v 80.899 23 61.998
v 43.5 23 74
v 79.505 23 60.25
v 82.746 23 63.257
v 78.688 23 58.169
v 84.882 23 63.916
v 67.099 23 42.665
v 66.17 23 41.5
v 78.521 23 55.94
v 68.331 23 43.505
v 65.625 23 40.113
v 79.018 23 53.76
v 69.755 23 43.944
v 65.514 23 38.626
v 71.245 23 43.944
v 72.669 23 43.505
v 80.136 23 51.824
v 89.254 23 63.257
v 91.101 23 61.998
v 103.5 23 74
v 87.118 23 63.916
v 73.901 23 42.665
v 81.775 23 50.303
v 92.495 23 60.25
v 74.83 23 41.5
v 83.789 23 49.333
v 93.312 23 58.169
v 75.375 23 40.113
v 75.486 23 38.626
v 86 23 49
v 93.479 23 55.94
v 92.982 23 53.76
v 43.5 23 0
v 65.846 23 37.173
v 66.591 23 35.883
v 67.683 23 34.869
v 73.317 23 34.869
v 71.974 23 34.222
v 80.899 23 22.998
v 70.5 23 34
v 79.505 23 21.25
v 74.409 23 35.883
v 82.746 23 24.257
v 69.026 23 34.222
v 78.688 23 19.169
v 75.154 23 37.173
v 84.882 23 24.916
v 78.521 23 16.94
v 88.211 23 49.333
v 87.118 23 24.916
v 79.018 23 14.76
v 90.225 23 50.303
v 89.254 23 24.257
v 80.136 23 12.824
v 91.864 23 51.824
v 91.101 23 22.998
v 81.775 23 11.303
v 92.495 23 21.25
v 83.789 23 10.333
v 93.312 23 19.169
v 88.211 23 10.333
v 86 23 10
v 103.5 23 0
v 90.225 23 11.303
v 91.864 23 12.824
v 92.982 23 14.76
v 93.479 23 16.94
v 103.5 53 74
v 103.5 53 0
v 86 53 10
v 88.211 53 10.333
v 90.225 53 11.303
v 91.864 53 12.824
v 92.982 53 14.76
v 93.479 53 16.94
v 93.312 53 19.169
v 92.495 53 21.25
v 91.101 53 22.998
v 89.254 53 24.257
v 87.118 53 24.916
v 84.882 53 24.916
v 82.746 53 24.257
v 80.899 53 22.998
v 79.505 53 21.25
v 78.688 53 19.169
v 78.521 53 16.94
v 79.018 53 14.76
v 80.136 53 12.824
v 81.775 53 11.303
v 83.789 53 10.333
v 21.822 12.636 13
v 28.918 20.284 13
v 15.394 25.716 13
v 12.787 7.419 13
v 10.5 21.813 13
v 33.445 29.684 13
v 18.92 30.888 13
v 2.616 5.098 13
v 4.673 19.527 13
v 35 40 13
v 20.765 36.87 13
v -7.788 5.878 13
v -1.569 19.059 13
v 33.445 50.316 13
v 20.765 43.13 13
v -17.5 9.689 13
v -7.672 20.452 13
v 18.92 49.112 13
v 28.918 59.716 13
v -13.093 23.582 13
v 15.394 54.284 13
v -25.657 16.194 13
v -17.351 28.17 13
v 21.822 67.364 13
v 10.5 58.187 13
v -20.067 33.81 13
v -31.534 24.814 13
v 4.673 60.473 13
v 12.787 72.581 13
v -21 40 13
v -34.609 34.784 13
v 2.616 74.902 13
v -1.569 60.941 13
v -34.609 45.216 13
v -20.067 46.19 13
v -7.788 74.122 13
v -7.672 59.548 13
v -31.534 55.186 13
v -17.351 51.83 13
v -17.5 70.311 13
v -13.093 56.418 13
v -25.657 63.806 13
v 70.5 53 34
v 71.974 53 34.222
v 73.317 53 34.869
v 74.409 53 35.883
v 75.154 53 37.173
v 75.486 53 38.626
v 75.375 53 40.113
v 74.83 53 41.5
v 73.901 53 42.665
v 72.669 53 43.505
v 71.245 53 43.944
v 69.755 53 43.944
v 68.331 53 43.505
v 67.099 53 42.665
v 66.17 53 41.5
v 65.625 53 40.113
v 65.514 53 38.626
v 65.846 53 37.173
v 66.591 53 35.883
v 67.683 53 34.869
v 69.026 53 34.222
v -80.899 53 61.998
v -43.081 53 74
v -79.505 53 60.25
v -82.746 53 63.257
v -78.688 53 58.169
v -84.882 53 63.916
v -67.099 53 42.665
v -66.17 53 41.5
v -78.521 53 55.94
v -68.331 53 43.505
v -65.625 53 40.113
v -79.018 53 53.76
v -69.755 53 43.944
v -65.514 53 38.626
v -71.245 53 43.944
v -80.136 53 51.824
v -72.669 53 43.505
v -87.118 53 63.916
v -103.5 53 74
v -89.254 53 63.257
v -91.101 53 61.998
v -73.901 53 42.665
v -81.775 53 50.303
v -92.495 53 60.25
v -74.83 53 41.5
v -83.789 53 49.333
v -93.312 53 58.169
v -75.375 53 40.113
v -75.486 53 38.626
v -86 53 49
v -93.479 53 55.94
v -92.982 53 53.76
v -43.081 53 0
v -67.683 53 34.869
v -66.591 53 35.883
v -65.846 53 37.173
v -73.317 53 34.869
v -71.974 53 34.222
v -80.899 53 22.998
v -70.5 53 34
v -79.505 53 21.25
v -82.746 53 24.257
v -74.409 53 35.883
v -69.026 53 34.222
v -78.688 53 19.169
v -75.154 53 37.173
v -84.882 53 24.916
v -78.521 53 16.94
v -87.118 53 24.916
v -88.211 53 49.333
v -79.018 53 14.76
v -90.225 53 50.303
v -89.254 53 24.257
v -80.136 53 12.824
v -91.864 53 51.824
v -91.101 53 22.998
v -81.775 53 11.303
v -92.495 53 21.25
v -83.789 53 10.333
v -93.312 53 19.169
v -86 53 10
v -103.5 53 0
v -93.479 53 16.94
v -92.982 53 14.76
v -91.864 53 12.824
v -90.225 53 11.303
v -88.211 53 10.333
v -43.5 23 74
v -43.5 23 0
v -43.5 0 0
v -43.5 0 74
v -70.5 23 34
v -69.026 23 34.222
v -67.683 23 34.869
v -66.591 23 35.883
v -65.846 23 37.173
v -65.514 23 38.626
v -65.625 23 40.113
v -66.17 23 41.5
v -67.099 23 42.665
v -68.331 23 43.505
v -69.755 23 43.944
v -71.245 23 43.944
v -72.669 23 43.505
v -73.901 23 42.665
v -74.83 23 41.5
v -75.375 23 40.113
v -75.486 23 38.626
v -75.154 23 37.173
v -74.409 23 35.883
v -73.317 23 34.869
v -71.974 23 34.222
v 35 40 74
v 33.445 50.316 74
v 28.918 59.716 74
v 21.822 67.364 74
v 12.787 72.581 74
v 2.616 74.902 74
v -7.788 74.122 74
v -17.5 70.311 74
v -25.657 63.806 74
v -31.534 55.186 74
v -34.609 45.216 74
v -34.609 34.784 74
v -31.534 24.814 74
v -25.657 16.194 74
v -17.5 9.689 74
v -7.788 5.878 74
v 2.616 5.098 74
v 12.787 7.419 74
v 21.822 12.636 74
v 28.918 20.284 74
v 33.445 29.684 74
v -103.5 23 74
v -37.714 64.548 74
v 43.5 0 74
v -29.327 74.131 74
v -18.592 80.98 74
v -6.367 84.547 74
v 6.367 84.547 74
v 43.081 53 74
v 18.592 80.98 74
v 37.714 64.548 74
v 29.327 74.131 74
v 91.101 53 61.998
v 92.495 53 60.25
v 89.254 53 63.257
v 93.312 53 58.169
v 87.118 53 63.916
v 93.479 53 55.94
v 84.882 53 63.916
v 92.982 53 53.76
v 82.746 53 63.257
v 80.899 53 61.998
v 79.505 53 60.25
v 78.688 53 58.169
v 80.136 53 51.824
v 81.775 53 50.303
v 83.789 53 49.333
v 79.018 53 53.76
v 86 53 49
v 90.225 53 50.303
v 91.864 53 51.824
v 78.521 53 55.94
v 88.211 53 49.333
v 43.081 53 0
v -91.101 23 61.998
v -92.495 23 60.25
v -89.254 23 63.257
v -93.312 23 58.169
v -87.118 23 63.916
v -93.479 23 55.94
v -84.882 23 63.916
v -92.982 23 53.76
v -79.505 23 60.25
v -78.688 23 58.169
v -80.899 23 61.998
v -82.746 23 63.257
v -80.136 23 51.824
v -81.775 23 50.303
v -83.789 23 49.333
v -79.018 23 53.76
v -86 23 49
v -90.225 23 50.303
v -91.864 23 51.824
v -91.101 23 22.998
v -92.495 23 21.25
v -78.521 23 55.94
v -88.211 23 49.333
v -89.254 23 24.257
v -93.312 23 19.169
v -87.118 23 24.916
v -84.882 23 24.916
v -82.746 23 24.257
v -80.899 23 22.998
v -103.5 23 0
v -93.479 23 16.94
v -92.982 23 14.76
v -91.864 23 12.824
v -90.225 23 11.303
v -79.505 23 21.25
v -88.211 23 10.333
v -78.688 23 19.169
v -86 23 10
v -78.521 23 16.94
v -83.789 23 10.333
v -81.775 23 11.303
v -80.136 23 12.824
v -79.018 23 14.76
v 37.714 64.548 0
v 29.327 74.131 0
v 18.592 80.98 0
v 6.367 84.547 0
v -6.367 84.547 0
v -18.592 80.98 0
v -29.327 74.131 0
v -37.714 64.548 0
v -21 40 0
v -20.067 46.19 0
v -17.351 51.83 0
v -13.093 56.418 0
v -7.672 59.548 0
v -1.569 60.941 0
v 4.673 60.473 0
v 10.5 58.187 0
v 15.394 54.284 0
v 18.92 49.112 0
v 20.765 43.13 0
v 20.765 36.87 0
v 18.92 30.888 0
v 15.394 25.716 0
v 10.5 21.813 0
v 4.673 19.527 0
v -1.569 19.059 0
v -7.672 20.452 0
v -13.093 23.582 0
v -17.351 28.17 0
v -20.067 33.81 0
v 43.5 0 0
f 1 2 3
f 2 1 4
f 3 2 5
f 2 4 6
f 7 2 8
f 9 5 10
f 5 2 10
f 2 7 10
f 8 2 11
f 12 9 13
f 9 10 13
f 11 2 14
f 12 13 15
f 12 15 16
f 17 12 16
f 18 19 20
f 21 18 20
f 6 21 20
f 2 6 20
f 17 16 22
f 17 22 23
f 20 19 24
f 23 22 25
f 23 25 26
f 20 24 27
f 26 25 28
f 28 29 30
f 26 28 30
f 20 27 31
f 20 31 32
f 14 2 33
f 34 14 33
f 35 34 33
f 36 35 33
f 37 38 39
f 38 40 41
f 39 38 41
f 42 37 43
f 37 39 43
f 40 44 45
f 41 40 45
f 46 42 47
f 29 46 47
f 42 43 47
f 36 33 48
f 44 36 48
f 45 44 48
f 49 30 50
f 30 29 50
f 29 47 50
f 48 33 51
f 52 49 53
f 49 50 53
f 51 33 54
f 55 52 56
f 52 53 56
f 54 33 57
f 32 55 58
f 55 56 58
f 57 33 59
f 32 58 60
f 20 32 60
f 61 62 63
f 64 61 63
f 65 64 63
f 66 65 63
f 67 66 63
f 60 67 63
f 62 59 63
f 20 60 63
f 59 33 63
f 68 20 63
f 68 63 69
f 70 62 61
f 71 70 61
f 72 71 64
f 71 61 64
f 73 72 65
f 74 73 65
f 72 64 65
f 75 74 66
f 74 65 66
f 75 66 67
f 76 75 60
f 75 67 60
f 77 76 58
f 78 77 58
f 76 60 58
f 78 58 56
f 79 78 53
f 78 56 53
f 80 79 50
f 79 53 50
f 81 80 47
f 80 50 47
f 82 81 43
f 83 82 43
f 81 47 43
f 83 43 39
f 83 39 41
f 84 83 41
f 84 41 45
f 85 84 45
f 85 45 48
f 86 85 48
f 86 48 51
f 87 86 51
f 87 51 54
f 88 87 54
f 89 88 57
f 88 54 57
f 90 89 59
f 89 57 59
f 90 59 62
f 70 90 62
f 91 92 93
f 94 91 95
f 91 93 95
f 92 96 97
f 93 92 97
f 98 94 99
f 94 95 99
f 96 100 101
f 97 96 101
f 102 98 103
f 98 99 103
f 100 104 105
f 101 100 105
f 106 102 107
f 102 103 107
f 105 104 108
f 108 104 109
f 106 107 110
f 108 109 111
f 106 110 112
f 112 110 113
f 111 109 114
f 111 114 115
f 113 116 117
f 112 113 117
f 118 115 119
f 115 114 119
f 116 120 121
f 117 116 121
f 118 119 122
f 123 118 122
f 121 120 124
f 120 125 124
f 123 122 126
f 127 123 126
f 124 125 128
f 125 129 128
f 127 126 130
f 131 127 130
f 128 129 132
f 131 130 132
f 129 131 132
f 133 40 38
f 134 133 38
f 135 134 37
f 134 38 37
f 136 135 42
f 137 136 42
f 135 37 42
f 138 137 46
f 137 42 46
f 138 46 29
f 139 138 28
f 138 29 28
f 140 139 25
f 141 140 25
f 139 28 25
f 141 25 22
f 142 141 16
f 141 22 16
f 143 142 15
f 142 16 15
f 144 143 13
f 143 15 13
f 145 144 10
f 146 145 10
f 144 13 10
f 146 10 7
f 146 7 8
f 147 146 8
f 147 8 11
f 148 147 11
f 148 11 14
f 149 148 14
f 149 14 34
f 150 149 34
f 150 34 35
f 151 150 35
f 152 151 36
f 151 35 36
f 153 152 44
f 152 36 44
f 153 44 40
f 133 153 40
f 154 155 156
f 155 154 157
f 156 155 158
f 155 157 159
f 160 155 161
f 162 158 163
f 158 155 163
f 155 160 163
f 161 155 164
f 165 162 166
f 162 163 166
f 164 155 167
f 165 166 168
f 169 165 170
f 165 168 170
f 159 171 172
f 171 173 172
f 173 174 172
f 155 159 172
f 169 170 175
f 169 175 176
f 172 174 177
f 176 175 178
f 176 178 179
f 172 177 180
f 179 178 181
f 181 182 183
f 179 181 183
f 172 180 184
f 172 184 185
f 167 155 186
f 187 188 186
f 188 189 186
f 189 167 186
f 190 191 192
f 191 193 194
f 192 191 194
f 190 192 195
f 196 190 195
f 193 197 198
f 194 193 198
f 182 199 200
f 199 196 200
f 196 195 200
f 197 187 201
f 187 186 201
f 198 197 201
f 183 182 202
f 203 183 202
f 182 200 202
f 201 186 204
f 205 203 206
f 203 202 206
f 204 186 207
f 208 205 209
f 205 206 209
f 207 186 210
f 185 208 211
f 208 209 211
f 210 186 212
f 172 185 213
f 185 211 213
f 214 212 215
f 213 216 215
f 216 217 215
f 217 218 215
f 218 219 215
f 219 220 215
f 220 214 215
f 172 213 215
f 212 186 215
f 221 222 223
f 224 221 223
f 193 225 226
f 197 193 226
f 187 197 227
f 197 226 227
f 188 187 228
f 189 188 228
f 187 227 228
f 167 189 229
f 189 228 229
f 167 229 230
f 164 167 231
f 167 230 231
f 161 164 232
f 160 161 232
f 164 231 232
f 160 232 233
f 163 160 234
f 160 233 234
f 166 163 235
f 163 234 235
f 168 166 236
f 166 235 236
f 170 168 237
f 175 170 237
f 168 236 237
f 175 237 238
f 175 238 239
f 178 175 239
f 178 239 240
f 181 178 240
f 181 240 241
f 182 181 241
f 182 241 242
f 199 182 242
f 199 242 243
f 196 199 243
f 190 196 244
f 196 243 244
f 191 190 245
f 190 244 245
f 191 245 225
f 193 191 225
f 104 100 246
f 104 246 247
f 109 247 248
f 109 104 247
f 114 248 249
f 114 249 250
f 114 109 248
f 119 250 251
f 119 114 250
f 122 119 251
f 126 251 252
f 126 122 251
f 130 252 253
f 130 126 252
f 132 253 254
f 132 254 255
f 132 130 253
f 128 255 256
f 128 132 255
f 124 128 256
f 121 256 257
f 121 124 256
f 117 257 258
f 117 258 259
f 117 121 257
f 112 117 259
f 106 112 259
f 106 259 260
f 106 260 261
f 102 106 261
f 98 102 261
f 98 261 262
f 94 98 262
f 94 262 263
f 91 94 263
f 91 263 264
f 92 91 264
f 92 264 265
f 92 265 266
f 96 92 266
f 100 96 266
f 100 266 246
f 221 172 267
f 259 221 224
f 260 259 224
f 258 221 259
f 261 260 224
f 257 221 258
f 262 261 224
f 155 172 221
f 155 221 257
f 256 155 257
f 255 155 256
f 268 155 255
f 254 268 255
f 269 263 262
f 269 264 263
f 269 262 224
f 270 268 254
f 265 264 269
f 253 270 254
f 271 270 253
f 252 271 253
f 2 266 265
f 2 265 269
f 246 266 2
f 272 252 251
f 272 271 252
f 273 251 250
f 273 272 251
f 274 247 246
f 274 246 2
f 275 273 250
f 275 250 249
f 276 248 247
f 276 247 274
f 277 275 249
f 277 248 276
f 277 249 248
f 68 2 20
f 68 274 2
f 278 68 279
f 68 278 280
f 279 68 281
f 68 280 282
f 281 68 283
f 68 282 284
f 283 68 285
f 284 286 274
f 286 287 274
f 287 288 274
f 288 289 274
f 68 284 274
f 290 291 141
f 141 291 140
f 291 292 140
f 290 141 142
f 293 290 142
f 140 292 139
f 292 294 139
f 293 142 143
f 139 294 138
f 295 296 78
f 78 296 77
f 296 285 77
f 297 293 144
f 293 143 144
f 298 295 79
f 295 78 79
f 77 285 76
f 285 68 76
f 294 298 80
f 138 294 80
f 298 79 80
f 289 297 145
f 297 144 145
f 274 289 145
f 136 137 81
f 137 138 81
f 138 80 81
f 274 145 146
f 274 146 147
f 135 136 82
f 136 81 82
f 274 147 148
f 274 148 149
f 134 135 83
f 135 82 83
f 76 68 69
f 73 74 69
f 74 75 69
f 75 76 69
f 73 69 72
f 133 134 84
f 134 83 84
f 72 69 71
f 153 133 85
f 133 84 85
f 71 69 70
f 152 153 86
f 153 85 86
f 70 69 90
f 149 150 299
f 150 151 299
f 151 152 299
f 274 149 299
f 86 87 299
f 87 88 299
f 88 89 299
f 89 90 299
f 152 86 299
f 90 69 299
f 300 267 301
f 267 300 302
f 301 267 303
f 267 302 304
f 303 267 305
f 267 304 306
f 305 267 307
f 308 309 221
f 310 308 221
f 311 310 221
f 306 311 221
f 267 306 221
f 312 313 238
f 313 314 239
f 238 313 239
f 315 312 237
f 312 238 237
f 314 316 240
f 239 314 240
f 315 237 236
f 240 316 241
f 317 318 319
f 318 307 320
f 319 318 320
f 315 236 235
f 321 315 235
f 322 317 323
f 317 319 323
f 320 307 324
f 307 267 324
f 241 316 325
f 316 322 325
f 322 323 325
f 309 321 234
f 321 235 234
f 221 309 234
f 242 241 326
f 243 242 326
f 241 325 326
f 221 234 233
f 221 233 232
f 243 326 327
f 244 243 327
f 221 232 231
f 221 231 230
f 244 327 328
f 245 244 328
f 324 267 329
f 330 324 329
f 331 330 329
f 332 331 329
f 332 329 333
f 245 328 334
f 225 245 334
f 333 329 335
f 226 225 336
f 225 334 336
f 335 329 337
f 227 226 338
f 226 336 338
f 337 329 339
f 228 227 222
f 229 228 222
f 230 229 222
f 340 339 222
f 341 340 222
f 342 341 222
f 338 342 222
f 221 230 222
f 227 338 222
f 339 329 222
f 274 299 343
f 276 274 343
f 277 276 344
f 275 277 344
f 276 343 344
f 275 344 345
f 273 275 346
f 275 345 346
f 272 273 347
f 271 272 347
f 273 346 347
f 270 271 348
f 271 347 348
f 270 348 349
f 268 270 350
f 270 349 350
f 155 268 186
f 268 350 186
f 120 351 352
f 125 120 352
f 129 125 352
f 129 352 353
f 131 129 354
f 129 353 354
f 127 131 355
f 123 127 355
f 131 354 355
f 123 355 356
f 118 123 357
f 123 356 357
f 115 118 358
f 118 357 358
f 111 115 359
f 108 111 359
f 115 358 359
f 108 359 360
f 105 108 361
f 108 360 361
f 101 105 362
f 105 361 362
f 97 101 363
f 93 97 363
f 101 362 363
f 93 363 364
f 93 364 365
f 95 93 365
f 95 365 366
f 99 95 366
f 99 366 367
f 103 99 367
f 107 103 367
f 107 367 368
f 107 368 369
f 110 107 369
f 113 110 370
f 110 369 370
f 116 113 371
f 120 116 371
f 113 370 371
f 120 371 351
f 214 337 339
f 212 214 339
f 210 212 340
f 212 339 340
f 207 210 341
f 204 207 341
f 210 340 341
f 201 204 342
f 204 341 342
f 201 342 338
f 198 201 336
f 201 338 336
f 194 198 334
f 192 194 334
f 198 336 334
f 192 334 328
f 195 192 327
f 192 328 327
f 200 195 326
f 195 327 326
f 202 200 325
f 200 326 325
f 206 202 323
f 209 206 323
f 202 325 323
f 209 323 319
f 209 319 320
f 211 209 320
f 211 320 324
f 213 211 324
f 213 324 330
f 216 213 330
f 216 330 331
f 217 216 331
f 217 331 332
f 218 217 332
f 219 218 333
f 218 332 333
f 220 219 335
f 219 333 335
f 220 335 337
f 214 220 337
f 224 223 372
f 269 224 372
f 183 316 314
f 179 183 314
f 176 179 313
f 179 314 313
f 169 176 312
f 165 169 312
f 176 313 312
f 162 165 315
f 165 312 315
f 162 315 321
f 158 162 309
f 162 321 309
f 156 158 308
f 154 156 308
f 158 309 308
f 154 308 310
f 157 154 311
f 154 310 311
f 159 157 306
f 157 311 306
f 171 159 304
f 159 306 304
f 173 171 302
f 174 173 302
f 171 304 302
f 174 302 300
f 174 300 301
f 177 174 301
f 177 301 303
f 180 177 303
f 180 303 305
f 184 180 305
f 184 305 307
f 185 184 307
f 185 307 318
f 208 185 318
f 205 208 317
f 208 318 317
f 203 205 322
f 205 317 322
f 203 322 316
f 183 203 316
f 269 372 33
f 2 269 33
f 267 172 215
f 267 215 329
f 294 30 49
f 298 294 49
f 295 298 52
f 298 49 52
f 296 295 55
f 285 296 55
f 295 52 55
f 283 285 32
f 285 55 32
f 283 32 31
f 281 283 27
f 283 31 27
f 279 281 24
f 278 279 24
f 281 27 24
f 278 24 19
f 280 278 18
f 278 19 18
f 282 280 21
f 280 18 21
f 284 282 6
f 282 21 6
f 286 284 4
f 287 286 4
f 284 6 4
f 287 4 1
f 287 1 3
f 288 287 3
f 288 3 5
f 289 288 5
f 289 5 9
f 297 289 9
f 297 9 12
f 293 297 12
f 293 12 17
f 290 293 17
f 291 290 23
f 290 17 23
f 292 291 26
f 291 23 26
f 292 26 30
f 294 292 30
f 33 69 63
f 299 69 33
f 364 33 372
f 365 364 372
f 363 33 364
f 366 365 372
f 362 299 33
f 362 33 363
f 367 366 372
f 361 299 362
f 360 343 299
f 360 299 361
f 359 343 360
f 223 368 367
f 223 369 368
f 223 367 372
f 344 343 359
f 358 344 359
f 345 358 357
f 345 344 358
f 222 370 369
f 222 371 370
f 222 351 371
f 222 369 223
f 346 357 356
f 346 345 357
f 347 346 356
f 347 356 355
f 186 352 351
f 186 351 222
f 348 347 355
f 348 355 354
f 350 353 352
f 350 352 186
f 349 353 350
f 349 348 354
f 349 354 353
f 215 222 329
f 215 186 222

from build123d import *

# Parameters (mm, degrees)
SKETCH_1_R          = 35
EXTRUDE_1_DEPTH     = 74
SKETCH_2_R          = 35
SKETCH_2_R_2        = 21
EXTRUDE_2_DEPTH     = 13
SKETCH_3_R          = 7.5
SKETCH_3_R_2        = 5
CUT_EXTRUDE_1_DEPTH = 30


with BuildPart() as part:
    # 草图1 → 凸台-拉伸1 (new body)
    with BuildSketch(Plane.XY):
        with BuildLine():
            Line((-43.5, 0), (43.5, 0))
            Line((43.5, 0), (43.5, 23))
            Line((43.5, 23), (103.5, 23))
            Line((103.5, 23), (103.5, 53))
            Line((103.5, 53), (43.081318457, 53))
            ThreePointArc((43.081318457, 53), (0, 85), (-43.081318457, 53))
            Line((-43.081318457, 53), (-103.5, 53))
            Line((-103.5, 53), (-103.5, 23))
            Line((-103.5, 23), (-43.5, 23))
            Line((-43.5, 23), (-43.5, 0))
        make_face()
        with Locations((0, 40)):
            Circle(SKETCH_1_R, mode=Mode.SUBTRACT)
    extrude(amount=EXTRUDE_1_DEPTH)

    # 草图2 → 凸台-拉伸2 (add)
    with BuildSketch(Plane(origin=(0, 0, 0), x_dir=(-1, 0, 0), z_dir=(0, 0, -1))):
        with Locations((0, 40)):
            Circle(SKETCH_2_R)
        with Locations((0, 40)):
            Circle(SKETCH_2_R_2, mode=Mode.SUBTRACT)
    extrude(amount=-EXTRUDE_2_DEPTH)

    # 草图3 → 切除-拉伸1 (cut)
    with BuildSketch(Plane.XZ.offset(-23)):
        with Locations(Location((-86, 56.5, 0), (0, 0, 270))):
            Circle(SKETCH_3_R)
        with Locations(Location((-70.5, 39, 0), (0, 0, 270))):
            Circle(SKETCH_3_R_2)
        with Locations(Location((-86, 17.5, 0), (0, 0, 270))):
            Circle(SKETCH_3_R)
        with Locations(Location((86, 56.5, 0), (0, 0, 270))):
            Circle(SKETCH_3_R)
        with Locations(Location((70.5, 39, 0), (0, 0, 270))):
            Circle(SKETCH_3_R_2)
        with Locations(Location((86, 17.5, 0), (0, 0, 270))):
            Circle(SKETCH_3_R)
    extrude(amount=-CUT_EXTRUDE_1_DEPTH, mode=Mode.SUBTRACT)


solid = part.part
